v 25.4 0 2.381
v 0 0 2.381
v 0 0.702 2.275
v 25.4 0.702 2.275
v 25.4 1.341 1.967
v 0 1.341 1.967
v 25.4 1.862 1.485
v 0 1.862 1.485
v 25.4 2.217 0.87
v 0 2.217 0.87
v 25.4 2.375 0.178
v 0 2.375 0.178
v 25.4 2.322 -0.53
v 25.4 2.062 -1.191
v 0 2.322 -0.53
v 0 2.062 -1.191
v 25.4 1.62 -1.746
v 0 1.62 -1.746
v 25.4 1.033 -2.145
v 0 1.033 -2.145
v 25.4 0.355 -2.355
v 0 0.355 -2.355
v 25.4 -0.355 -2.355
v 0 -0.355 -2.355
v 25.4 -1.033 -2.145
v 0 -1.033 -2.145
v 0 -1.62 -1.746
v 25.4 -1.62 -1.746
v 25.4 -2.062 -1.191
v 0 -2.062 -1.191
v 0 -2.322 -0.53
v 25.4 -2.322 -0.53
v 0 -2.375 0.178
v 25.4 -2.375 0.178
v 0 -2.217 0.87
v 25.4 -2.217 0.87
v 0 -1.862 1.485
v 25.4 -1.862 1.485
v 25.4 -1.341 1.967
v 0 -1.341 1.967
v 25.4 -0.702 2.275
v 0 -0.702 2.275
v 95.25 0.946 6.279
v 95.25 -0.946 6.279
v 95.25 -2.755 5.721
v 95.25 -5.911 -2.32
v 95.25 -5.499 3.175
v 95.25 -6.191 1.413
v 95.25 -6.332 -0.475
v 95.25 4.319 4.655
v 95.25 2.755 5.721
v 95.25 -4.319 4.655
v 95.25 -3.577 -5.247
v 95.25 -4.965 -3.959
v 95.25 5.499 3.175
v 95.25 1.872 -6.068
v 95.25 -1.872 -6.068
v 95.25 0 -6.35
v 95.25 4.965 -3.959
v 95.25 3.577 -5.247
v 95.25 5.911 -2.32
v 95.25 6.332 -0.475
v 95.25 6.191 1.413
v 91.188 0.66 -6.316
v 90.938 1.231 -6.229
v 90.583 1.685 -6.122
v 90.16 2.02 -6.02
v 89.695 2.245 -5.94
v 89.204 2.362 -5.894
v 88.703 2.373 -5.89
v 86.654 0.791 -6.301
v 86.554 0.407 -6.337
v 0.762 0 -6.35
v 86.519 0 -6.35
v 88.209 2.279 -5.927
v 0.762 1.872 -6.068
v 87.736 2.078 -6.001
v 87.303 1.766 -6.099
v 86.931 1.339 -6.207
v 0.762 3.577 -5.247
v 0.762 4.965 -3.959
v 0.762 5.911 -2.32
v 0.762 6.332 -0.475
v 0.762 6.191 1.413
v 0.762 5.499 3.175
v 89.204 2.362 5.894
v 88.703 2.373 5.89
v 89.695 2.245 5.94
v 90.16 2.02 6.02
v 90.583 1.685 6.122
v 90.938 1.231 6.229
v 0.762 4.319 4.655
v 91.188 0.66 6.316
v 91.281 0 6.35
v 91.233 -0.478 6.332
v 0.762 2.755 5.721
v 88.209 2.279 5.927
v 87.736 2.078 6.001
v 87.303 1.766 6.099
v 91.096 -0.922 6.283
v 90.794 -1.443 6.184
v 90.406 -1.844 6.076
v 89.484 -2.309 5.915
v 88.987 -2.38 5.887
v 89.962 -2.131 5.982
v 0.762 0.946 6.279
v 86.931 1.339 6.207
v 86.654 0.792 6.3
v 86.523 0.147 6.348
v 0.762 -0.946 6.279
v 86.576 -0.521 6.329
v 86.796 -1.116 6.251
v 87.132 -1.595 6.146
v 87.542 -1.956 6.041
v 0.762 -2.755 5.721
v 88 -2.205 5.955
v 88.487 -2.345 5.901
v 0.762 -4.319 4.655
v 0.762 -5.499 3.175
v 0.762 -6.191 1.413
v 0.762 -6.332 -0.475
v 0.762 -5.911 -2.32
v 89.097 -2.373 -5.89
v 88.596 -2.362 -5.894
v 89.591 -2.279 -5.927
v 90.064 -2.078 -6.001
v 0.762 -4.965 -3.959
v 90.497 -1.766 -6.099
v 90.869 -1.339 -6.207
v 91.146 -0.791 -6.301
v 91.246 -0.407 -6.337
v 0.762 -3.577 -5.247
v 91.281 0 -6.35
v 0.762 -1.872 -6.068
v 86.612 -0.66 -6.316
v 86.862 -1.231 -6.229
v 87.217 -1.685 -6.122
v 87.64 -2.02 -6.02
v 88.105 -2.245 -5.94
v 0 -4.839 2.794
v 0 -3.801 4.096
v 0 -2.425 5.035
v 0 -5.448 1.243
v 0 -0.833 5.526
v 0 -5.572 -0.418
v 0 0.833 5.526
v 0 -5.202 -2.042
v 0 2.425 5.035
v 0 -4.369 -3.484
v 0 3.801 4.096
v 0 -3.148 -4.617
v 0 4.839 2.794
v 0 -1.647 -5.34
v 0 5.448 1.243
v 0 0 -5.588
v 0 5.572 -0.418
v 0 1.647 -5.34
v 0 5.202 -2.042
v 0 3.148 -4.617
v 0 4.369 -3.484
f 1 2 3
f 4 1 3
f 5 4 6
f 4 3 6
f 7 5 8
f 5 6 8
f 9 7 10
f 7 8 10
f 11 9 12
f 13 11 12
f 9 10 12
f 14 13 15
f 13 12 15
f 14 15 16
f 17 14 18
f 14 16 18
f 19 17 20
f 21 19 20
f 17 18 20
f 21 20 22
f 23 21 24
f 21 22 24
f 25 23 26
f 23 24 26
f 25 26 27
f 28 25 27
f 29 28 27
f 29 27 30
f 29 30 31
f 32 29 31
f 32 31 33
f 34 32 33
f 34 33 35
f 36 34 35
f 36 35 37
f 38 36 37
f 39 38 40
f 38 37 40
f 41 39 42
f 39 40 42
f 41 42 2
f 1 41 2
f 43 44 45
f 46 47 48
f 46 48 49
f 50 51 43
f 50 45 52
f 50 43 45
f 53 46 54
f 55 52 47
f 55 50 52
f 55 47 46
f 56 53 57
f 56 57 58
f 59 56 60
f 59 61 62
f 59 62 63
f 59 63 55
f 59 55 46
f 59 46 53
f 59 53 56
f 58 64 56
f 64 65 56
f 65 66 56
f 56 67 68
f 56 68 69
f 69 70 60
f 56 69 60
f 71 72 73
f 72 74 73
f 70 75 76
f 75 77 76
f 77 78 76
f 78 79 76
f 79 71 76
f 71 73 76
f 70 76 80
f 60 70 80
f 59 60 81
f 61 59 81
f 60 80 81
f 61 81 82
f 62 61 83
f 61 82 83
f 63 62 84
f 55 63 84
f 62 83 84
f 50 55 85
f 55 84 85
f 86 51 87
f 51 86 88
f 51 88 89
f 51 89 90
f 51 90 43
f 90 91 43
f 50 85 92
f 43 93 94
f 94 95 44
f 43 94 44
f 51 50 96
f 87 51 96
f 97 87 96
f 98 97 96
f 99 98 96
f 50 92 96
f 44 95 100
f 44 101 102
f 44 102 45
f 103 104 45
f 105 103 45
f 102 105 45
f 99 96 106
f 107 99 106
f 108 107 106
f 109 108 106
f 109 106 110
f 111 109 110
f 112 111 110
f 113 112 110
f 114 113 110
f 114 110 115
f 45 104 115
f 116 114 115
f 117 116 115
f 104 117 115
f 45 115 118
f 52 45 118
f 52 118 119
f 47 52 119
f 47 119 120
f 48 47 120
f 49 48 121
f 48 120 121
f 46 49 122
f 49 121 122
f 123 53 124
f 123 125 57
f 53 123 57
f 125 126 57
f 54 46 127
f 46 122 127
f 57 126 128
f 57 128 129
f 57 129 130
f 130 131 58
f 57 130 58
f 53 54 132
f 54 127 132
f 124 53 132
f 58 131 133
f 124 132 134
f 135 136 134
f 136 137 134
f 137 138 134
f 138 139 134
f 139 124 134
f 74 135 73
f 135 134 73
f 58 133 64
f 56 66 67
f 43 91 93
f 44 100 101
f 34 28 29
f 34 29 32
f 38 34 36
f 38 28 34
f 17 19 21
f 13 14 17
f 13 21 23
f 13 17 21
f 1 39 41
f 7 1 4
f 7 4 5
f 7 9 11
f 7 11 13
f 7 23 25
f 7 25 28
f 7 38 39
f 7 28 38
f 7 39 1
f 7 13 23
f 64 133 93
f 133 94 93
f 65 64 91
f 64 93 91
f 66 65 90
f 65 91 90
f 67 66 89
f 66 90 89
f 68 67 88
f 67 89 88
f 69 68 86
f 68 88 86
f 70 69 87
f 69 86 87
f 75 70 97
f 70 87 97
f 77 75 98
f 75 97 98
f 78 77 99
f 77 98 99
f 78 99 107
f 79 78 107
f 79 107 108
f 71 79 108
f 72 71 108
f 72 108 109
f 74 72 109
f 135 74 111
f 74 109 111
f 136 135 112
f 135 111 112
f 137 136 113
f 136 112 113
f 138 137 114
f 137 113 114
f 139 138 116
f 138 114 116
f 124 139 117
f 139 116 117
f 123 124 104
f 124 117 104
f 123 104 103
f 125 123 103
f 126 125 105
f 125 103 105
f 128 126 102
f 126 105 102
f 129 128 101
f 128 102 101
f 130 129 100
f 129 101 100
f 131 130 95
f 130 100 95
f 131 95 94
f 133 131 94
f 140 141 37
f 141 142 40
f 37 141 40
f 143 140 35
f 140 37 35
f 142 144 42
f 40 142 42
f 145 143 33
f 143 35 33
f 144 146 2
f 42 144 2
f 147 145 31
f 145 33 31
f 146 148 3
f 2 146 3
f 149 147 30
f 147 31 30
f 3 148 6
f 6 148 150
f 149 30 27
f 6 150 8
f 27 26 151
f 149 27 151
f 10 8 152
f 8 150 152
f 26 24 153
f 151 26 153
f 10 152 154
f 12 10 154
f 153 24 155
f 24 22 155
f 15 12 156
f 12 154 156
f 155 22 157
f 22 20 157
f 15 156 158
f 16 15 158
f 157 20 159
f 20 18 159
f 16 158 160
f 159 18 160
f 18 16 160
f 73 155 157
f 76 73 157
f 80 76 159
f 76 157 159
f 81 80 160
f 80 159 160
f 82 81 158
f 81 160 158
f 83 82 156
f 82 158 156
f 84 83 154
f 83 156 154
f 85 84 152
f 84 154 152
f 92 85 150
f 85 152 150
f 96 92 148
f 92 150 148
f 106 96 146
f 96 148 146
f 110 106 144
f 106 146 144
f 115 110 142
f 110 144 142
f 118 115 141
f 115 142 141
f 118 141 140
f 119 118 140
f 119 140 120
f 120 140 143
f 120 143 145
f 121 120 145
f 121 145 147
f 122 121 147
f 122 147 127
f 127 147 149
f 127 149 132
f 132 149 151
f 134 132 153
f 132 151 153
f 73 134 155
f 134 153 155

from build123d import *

# Parameters (mm, degrees)
SKETCH1_R               = 6.35
BASE_EXTRUDE_DEPTH      = 95.25
SKETCH2_R               = 2.38125
CUT_EXTRUDE1_DEPTH      = 7.35
CUT_EXTRUDE1_DEPTH_BACK = 7.35
SKETCH3_R               = 2.38125
CUT_EXTRUDE2_DEPTH      = 25.4
CHAMFER2_SIZE           = 0.762


with BuildPart() as part:
    # Sketch1 → Base-Extrude (new body)
    with BuildSketch(Plane(origin=(0, 0, 0), x_dir=(0, 0, -1), z_dir=(1, 0, 0))):
        Circle(SKETCH1_R)
    extrude(amount=BASE_EXTRUDE_DEPTH)

    # Sketch2 → Cut-Extrude1 (cut, two sides)
    with BuildSketch(Plane.XY) as cut_extrude1_sk:
        with Locations((88.9, 0)):
            Circle(SKETCH2_R)
    extrude(amount=CUT_EXTRUDE1_DEPTH, mode=Mode.SUBTRACT)
    extrude(cut_extrude1_sk.sketch, amount=-CUT_EXTRUDE1_DEPTH_BACK, mode=Mode.SUBTRACT)

    # Sketch3 → Cut-Extrude2 (cut)
    with BuildSketch(Plane.ZY):
        Circle(SKETCH3_R)
    extrude(amount=-CUT_EXTRUDE2_DEPTH, mode=Mode.SUBTRACT)

    # Chamfer2
    chamfer2_edges = [part.edges().sort_by_distance(p)[0] for p in [
        (0, 0, 6.35),
    ]]
    chamfer(chamfer2_edges, length=CHAMFER2_SIZE)


solid = part.part
